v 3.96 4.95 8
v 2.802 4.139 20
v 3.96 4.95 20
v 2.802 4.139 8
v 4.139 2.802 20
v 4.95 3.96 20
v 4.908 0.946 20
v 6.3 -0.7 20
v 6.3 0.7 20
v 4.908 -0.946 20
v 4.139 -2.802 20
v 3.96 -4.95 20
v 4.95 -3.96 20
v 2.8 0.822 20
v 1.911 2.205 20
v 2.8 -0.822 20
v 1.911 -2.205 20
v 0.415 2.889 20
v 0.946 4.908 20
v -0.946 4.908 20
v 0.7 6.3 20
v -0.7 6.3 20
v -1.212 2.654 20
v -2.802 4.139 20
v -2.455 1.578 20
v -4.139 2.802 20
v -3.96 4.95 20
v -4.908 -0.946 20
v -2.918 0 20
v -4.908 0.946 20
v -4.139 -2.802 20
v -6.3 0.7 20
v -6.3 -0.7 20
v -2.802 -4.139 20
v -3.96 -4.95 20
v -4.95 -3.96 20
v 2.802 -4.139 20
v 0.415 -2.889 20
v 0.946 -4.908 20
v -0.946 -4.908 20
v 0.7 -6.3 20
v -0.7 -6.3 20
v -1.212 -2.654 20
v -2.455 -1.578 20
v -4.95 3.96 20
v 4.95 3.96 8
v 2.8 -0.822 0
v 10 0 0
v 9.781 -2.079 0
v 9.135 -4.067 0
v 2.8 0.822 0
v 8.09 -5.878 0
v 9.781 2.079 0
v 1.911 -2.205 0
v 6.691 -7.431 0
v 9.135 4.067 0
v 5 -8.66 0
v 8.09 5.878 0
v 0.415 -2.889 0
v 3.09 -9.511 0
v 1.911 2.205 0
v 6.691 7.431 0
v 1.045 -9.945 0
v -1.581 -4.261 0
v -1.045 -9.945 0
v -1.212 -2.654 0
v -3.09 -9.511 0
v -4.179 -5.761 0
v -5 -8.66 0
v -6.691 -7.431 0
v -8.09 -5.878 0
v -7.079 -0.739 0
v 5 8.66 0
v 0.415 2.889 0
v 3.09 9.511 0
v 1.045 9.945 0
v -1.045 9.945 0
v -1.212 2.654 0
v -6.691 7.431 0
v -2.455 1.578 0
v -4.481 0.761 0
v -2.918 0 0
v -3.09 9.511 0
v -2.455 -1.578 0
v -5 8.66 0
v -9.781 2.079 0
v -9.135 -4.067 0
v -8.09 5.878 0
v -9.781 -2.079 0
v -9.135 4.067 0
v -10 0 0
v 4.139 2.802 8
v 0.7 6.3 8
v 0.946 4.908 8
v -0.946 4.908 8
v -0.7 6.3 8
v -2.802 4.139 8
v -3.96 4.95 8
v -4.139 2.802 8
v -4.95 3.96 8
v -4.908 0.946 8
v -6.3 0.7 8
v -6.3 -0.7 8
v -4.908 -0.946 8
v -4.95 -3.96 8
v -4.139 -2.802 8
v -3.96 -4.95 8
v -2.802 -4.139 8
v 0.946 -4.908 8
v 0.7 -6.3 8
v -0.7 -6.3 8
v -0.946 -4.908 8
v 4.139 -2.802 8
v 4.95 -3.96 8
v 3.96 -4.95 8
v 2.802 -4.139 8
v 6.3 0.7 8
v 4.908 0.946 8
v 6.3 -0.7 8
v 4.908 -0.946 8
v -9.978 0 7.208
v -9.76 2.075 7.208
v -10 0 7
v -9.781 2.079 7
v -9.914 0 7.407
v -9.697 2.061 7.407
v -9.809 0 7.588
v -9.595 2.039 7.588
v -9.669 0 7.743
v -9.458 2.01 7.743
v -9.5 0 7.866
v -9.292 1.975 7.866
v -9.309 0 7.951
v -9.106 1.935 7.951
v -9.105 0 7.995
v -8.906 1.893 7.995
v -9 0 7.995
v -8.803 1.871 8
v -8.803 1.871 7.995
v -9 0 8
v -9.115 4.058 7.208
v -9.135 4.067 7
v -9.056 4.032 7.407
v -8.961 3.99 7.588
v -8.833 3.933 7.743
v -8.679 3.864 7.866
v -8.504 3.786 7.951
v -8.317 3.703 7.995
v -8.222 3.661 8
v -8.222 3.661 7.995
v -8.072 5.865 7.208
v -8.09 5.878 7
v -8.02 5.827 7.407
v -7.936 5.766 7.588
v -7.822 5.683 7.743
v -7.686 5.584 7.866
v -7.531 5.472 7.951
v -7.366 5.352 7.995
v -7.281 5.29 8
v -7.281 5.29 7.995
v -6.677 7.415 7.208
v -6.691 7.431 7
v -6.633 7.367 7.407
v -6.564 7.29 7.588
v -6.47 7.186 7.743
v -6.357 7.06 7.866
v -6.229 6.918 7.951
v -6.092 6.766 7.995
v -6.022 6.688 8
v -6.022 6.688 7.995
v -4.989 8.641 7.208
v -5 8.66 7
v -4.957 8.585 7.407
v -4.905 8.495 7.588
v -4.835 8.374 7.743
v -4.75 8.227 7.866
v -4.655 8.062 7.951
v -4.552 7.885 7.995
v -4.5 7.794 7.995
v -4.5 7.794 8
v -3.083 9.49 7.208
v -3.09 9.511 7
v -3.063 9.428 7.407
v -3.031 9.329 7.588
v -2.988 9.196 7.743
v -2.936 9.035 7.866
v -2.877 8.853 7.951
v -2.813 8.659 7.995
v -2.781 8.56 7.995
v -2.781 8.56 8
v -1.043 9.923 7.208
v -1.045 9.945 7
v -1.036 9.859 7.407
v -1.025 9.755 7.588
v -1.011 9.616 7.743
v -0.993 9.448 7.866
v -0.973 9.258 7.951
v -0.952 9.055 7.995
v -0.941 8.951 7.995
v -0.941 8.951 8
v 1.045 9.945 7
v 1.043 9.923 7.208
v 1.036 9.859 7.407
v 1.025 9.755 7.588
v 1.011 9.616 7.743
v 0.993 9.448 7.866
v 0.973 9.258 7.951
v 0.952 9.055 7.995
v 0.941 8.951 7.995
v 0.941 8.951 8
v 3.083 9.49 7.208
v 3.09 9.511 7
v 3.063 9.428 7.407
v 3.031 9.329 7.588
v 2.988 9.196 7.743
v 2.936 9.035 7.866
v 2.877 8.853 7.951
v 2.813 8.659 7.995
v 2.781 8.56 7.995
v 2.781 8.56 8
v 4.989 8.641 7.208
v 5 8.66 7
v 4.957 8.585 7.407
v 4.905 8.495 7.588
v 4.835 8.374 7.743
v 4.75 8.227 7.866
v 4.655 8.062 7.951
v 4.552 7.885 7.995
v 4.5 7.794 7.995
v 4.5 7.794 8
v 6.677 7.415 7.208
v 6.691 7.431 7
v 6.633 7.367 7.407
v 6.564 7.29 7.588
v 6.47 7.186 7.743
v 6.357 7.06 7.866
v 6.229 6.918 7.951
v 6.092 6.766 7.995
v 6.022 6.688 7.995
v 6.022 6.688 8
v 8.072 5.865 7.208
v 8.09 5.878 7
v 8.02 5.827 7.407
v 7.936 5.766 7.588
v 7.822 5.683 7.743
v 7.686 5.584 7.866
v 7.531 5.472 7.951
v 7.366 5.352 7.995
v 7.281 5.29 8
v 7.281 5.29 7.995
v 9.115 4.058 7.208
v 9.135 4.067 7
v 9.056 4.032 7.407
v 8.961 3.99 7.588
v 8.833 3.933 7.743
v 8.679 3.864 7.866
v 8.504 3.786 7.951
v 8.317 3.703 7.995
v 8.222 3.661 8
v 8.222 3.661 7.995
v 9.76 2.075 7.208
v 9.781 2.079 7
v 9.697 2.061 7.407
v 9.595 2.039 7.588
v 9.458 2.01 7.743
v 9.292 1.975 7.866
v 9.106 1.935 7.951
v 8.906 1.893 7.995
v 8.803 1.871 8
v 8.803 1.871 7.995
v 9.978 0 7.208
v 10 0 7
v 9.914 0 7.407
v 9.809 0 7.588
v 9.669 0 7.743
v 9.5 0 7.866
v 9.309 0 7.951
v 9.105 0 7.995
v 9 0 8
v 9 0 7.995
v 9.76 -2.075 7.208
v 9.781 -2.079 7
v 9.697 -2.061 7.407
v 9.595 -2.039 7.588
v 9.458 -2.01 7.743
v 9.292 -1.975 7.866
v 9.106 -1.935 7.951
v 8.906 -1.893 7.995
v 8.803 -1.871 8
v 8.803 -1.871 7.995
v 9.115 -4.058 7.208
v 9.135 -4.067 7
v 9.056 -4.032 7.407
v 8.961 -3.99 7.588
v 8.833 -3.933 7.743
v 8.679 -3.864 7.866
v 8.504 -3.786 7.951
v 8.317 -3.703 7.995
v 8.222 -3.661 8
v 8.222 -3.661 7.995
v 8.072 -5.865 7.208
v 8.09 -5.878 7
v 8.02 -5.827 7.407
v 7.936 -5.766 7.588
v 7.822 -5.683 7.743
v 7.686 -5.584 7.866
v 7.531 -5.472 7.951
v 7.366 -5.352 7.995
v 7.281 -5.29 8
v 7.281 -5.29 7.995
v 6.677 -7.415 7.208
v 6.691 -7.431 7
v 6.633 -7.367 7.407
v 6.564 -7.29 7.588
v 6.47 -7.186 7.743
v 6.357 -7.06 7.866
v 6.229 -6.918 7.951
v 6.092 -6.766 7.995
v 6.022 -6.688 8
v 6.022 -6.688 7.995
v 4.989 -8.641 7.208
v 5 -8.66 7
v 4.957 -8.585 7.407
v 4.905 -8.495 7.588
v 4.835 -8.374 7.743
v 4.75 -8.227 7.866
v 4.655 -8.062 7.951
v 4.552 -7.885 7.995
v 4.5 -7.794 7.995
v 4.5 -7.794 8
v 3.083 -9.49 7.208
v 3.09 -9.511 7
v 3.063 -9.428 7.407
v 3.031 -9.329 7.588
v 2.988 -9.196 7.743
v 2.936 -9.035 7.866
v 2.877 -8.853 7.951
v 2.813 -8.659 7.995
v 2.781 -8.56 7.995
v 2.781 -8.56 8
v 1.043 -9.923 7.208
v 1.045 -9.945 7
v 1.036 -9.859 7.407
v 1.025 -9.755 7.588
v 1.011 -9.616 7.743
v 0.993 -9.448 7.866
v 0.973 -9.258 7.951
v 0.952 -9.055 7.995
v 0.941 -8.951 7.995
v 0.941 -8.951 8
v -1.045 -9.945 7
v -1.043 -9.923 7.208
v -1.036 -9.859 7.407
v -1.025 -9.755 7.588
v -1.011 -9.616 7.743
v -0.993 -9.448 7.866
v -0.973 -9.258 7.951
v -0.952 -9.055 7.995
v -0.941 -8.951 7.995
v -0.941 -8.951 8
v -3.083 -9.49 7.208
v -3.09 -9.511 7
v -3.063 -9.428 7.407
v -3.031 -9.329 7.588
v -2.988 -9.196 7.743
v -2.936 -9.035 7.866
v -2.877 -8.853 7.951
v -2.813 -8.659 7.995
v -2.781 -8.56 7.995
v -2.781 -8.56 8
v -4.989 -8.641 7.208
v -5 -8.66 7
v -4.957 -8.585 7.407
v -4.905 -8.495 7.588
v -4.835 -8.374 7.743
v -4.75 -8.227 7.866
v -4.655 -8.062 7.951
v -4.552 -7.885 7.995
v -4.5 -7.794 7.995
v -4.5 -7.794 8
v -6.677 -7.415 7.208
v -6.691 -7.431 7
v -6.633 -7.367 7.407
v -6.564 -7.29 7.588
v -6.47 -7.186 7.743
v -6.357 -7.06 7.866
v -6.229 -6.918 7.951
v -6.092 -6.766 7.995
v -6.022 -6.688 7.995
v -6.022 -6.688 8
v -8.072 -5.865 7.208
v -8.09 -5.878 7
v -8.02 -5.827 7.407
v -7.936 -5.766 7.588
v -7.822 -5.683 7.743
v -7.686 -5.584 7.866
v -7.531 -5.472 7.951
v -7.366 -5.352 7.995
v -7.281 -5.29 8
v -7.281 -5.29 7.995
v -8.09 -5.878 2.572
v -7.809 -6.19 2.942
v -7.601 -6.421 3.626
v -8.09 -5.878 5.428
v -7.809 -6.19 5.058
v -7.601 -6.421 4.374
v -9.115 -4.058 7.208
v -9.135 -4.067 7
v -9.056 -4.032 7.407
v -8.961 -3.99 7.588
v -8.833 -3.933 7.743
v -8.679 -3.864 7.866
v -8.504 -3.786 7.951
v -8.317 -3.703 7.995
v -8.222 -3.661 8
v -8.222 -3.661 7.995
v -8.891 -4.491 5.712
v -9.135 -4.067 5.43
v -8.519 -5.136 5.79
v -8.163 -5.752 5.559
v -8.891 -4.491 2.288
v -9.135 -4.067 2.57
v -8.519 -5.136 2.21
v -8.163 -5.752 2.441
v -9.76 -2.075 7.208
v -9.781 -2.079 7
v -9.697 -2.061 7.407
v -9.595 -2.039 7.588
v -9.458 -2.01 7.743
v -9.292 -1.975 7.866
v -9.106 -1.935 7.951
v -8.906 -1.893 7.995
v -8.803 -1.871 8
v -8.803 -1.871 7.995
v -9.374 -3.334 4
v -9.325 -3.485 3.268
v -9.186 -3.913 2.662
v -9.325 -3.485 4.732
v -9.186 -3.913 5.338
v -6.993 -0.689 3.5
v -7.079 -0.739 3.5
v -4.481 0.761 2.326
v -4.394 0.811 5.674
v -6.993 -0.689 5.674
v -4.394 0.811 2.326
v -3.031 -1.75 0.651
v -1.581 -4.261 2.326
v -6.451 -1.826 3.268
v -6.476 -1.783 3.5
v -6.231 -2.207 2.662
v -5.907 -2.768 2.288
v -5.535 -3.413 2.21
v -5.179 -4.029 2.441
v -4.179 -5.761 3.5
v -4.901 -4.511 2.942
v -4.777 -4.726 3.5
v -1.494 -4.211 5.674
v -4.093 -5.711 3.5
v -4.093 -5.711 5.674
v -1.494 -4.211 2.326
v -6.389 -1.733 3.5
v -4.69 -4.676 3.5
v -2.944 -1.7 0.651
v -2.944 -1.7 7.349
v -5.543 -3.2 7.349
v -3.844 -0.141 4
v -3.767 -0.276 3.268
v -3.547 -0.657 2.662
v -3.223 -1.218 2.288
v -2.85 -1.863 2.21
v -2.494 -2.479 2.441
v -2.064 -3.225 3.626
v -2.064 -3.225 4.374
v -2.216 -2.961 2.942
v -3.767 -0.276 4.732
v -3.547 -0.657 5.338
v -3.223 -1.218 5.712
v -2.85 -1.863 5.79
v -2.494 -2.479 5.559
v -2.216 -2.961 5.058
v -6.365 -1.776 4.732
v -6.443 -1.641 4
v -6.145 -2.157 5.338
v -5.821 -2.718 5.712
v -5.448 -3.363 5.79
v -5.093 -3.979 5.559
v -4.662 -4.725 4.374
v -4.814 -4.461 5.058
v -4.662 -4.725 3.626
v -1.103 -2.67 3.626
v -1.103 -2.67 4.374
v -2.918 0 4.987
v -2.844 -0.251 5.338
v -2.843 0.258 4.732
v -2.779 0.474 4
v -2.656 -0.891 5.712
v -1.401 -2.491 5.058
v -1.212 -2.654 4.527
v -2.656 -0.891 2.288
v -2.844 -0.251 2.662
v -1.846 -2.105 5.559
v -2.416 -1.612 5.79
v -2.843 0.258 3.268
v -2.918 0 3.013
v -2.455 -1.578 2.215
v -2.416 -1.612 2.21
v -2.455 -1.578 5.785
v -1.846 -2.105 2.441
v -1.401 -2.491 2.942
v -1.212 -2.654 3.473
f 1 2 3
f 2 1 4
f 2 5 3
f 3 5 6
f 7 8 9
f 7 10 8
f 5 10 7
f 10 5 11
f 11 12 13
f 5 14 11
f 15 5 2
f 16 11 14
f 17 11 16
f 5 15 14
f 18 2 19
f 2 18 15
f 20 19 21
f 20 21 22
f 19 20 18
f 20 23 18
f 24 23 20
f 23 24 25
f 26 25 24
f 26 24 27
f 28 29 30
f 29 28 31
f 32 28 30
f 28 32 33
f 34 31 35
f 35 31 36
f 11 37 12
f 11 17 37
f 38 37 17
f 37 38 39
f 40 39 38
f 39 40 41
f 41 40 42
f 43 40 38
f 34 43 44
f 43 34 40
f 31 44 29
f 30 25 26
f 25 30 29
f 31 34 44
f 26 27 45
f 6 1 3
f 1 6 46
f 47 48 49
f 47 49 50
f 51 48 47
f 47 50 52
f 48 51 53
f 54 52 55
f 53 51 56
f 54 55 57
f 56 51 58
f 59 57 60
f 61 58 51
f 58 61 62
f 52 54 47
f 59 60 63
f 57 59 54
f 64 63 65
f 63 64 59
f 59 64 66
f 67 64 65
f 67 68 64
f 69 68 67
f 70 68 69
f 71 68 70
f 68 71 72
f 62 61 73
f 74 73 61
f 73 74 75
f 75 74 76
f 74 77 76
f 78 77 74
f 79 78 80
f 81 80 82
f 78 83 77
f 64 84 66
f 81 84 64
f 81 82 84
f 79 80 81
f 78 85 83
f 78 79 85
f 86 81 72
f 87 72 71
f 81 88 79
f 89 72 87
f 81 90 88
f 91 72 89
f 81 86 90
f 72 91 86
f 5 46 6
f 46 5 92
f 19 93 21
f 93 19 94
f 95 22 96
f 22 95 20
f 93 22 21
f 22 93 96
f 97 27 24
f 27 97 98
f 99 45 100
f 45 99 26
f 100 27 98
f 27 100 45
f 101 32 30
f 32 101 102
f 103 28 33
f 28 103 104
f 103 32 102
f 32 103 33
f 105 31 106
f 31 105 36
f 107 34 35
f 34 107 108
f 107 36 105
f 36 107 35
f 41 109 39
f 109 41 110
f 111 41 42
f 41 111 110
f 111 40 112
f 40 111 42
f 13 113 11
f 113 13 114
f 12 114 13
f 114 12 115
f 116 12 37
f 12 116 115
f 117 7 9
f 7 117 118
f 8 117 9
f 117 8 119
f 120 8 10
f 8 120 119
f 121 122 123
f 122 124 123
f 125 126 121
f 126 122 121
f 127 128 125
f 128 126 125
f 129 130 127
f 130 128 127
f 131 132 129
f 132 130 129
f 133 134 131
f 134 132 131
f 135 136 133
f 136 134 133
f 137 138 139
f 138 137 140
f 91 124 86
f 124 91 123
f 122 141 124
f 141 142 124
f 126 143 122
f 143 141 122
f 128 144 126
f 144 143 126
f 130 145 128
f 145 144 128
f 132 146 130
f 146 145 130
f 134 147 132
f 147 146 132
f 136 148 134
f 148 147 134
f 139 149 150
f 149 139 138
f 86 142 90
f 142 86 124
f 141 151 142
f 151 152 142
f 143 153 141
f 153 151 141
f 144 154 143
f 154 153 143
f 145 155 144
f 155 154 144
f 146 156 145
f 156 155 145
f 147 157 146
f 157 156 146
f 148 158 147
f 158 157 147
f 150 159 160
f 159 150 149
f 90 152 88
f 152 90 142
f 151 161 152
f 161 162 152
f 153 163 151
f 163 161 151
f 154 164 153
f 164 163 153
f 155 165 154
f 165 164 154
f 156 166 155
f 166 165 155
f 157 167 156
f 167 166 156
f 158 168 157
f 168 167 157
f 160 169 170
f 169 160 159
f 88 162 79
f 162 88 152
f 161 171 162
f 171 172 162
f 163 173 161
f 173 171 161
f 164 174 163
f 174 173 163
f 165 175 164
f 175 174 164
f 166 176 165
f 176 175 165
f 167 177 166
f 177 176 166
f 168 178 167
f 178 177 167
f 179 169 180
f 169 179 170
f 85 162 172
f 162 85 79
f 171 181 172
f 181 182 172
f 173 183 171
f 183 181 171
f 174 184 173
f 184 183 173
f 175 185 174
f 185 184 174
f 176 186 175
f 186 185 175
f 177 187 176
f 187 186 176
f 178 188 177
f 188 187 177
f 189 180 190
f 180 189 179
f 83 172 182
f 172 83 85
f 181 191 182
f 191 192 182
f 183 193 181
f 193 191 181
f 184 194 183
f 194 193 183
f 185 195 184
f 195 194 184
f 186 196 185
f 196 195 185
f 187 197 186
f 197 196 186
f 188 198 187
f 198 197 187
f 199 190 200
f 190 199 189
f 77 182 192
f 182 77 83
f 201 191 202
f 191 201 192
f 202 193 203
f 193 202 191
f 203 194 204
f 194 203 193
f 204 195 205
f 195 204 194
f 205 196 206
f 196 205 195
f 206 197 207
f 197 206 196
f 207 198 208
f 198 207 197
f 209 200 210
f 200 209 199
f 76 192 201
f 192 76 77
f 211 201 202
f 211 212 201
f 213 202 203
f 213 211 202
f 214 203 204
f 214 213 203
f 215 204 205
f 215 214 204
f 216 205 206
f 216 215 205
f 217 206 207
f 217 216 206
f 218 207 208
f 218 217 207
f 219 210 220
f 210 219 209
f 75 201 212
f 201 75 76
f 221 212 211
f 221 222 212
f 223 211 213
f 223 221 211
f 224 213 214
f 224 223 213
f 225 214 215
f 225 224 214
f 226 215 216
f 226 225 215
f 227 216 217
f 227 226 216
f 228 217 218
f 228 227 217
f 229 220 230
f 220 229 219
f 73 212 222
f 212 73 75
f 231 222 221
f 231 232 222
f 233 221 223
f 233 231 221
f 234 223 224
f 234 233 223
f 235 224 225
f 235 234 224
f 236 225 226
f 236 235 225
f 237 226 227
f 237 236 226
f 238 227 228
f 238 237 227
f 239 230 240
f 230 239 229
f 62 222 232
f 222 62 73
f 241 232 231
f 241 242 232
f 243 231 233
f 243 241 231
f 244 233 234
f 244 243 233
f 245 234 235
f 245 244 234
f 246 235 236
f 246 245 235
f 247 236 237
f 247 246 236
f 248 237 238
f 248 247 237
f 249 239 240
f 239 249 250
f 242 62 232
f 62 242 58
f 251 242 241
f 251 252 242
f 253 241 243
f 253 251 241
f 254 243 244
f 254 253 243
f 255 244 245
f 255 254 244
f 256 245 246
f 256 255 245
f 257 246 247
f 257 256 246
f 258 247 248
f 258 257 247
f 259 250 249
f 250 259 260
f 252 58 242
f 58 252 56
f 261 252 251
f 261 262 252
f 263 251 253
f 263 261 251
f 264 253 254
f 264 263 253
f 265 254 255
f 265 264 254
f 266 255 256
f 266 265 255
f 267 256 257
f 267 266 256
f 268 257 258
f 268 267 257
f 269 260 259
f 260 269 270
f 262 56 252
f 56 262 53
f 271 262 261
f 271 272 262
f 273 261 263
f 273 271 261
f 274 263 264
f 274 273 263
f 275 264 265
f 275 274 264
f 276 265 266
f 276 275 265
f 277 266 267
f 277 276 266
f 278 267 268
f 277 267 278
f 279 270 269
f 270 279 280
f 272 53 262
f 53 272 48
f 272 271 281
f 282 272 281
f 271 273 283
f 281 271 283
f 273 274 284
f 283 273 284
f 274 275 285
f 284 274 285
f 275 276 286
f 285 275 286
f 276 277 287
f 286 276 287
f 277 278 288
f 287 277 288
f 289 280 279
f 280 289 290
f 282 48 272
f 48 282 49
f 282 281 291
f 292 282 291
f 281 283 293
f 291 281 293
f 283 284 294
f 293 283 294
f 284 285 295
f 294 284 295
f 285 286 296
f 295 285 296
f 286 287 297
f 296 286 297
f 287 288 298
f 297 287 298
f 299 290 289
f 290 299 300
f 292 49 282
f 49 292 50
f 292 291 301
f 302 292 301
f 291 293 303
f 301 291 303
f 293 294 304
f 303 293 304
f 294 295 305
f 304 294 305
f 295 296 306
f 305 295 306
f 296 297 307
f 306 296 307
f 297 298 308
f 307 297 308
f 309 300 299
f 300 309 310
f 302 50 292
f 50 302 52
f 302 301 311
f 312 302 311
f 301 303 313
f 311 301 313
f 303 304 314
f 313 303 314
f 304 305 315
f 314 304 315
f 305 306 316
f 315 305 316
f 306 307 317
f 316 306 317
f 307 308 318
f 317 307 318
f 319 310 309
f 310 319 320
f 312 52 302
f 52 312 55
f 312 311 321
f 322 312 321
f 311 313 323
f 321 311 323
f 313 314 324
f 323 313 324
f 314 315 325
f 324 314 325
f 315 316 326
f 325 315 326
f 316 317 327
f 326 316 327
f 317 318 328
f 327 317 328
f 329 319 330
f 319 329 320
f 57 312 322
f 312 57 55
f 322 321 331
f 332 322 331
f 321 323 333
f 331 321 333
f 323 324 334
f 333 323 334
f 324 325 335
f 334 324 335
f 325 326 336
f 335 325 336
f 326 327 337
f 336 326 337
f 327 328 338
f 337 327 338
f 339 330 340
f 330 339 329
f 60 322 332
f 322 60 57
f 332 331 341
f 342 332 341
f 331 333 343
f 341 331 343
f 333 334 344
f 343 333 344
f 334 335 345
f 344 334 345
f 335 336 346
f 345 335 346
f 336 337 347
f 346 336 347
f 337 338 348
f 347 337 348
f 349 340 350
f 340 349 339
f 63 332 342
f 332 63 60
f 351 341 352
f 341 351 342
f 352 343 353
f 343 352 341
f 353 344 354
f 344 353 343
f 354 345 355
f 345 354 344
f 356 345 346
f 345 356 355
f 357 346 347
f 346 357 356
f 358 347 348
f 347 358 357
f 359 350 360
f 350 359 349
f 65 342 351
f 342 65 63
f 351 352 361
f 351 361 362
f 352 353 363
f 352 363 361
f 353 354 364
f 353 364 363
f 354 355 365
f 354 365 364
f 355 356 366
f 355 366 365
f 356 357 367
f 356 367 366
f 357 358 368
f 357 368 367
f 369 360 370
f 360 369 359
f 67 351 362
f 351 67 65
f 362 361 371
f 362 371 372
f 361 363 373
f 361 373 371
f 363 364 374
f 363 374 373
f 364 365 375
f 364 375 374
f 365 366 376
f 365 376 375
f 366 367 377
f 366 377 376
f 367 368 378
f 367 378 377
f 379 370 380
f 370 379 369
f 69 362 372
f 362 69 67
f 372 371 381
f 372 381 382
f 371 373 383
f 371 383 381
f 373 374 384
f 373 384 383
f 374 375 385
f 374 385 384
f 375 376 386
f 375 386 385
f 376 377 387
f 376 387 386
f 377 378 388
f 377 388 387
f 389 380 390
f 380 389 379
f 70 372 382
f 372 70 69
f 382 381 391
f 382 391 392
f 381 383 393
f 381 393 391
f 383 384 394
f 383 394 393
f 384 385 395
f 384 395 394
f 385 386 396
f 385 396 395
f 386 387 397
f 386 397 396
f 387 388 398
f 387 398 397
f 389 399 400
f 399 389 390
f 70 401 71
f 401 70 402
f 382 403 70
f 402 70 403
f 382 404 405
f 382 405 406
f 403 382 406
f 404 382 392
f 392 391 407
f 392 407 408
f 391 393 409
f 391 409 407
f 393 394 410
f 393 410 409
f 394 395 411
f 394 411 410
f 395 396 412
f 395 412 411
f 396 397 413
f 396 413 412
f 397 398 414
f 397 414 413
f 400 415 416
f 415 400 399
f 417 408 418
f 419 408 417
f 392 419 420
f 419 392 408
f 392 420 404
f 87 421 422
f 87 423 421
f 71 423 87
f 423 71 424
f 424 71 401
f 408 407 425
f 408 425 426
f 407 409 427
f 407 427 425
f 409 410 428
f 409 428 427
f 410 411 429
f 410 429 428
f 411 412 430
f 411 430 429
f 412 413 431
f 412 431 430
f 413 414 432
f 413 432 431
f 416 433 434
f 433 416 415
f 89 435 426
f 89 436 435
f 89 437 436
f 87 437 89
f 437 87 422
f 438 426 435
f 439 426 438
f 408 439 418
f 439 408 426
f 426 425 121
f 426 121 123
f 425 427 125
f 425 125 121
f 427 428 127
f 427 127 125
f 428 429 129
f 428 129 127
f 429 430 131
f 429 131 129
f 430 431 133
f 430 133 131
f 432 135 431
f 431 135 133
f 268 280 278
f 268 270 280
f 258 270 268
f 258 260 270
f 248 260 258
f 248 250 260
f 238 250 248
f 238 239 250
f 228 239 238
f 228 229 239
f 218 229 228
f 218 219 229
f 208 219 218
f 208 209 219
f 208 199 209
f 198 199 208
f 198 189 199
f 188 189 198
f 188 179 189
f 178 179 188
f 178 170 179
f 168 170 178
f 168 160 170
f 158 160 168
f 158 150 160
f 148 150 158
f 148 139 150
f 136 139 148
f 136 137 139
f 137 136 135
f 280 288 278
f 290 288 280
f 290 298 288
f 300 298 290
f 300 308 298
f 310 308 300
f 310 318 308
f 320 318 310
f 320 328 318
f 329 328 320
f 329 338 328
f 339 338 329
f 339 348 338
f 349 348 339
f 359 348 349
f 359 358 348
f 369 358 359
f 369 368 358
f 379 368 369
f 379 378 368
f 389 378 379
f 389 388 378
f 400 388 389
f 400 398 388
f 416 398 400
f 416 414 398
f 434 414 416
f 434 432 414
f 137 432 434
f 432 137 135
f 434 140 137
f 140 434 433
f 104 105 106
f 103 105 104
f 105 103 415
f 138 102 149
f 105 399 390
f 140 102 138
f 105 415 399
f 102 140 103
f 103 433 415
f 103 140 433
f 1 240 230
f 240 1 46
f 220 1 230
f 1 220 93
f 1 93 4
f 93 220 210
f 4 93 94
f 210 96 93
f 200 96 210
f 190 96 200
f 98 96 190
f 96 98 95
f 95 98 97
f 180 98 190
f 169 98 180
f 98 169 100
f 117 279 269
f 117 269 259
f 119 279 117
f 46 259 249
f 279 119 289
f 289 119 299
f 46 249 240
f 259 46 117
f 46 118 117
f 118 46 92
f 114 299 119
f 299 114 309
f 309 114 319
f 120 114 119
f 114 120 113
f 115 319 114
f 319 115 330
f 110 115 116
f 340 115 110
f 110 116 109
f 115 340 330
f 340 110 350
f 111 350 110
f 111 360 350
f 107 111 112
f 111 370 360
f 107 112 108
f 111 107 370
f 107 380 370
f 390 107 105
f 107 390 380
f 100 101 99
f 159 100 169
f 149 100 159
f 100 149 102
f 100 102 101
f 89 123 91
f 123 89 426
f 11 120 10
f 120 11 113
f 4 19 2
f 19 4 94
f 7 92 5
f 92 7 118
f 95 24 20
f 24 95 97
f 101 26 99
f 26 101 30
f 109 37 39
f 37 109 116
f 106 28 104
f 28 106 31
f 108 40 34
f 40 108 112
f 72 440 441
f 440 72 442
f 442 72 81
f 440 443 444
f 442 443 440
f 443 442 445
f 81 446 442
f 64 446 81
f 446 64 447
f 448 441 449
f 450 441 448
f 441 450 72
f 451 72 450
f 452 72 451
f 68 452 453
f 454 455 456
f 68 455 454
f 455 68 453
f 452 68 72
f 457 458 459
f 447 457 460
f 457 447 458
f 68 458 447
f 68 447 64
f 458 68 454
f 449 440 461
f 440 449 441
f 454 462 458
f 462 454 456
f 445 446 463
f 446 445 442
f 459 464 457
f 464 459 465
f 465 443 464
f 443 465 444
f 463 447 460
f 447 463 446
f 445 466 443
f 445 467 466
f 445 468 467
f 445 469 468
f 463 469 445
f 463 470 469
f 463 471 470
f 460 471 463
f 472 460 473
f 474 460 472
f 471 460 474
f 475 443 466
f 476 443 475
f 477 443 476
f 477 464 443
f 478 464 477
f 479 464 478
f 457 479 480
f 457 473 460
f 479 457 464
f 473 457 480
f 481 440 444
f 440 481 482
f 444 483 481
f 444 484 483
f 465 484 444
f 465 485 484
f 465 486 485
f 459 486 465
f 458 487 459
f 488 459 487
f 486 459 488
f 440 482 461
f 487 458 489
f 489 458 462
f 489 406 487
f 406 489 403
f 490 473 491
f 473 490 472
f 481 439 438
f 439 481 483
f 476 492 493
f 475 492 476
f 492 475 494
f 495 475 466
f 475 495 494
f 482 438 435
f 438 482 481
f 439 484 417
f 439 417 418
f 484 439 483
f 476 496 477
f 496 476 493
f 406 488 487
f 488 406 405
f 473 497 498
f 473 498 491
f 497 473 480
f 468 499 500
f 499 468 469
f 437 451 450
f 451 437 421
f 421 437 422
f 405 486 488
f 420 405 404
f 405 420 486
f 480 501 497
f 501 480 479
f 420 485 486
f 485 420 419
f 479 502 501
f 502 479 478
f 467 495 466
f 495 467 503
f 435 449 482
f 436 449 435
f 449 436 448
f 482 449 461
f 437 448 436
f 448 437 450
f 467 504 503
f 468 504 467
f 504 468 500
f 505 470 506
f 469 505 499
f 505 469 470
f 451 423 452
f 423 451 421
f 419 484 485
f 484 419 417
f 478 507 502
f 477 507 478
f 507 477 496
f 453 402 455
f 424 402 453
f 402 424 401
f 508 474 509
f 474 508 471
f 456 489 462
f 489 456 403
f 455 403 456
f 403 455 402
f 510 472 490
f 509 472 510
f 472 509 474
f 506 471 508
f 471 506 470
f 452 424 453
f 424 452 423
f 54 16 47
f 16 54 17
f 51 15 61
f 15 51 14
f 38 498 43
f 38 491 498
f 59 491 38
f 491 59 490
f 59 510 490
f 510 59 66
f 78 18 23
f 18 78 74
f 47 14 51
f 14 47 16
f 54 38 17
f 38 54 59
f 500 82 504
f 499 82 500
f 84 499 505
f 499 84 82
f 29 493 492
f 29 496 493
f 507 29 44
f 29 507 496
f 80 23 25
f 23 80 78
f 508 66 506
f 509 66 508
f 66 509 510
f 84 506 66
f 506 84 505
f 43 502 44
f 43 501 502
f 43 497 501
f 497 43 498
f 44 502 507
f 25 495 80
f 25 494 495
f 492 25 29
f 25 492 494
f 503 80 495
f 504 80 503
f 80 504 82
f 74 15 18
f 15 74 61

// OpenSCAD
// file: functions.scad
// PRUSA Mendel  
// Functions used in many files
// GNU GPL v3
// Josef Průša
// josefprusa@me.com
// prusadjs.cz
// http://www.reprap.org/wiki/Prusa_Mendel
// http://github.com/prusajr/PrusaMendel


module nut(d,h,horizontal=true){
cornerdiameter =  (d / 2) / cos (180 / 6);
cylinder(h = h, r = cornerdiameter, $fn = 6);
if(horizontal){
for(i = [1:6]){
	rotate([0,0,60*i]) translate([-cornerdiameter-0.2,0,0]) rotate([0,0,-45]) cube(size = [2,2,h]);
}}
}

// Based on nophead research
module polyhole(d,h) {
    n = max(round(2 * d),3);
    rotate([0,0,180])
        cylinder(h = h, r = (d / 2) / cos (180 / n), $fn = n);
}




module roundcorner(diameter){
	difference(){
		cube(size = [diameter,diameter,99], center = false);
		translate(v = [diameter, diameter, 0]) cylinder(h = 100, r=diameter, center=true);
	}
}
// file: metric.scad
// PRUSA Mendel  
// Default metric sizes
// GNU GPL v3
// Josef Průša
// josefprusa@me.com
// prusadjs.cz
// http://www.reprap.org/wiki/Prusa_Mendel
// http://github.com/prusajr/PrusaMendel

// DONT CHANGE THIS FILE! ALTER VALUES IN CONFIGURATION.SCAD INSTEAD

// RODS

threaded_rod_diameter = 8.7;
threaded_rod_diameter_horizontal = 8.7;
smooth_bar_diameter = 8;
smooth_bar_diameter_horizontal = 8.5;

// Nuts and bolts

m8_diameter = 9;
m8_nut_diameter = 14.1;

m4_diameter = 4.5;
m4_nut_diameter = 9;

m3_diameter = 3.6;
m3_nut_diameter = 5.3;
m3_nut_diameter_horizontal = 6.1;

// Bushing holder

bushing_core_diameter = smooth_bar_diameter;
bushing_material_thickness = 1;

// Motors

motor_shaft = 5.5;
// file: configuration.scad
// PRUSA Mendel  
// Configuration file
// GNU GPL v3
// Josef Průša
// josefprusa@me.com
// prusadjs.cz
// http://www.reprap.org/wiki/Prusa_Mendel
// http://github.com/prusajr/PrusaMendel

// PLEASE SELECT ONE OF THE CONFIGURATIONS BELOW
// BY UN-COMMENTING IT

// Uncomment for metric settings
// METRIC METRIC METRIC METRIC METRIC METRIC METRIC METRIC 

include <metric.scad>;

// CUSTOM CUSTOM CUSTOM CUSTOM CUSTOM CUSTOM CUSTOM CUSTOM CUSTOM

thin_wall = 3;


// Linear bearing version
linear = false;
// set false for LM-8UU, true for LM-E-8UU (ignore if linear is set to false)
lme8uu = false;



// CHANGE ONLY THE STUFF YOU KNOW
// IT WILL REPLACE DEFAULT SETTING

// RODS

// threaded_rod_diameter = 0;
// threaded_rod_diameter_horizontal = 0;
// smooth_bar_diameter = 0;
// smooth_bar_diameter_horizontal = 0;

// Nuts and bolts

// m8_diameter = 0;
// m8_nut_diameter = 0;

// m4_diameter = 0;
// m4_nut_diameter = 0;

// m3_diameter = 0;
// m3_nut_diameter = 0;

// Bushing holder

// bushing_core_diameter = smooth_bar_diameter;
// bushing_material_thickness = 0;


///counted stuff
m3_nut_diameter_bigger = ((m3_nut_diameter  / 2) / cos (180 / 6))*2;

// functions 
include <functions.scad>
// main file
// Belt pulley is http://www.thingiverse.com/thing:3104 by GilesBathgate

// PRUSA Mendel  
// Bushings
// GNU GPL v3
// Josef Průša
// josefprusa@me.com
// prusadjs.cz
// http://www.reprap.org/wiki/Prusa_Mendel
// http://github.com/prusajr/PrusaMendel


include <configuration.scad>


/**
 * @id pulley
 * @name Pulley
 * @category Printed
 * @using 1 m3nut
 * @using 1 m3x10xhex
 */
module pulley()
{


	module spur()
	{
		linear_extrude(height=20) polygon([[-1,-1],[-1,1],[0.7,0.7],[0.7,-0.7]],[[0,1,2,3,0]]);
	}
	
 difference()
 {	 
 	union()
 	{
 		//base
 		rotate_extrude($fn=30)
 		{
 				square([9,8]);
 				square([10,7]);
 				translate([9,7]) circle(1);
 		}
    	
    	//shaft
    	cylinder(r=motor_shaft-0.2,h=20, $fn=8);
    	
    	//spurs
    	for(i=[1:8]) rotate([0,0,i*(360/8)])
    	translate([5.6,0,0])spur();
   }
   
   //shaft hole
    translate([0,0,-1])polyhole(motor_shaft+0.1,22);
    		
 //captive nut and grub holes
    for(j=[1:1]) rotate([0,0,j*(360/3)])
	translate([0,20,4])rotate([90,0,0])
	union()
	{
		//entrance
		translate([0,-3,15]) cube([m3_nut_diameter+0.5,5,3],center=true);
		//nut
		translate([0,0,13.6]) rotate([0,0,30]) nut(m3_nut_diameter+0.5, 3, false);
		//grub hole
		translate([0,0,9]) cylinder(r=m3_diameter/2,h=10, $fn=15);
	}

 }

   
}

pulley();
